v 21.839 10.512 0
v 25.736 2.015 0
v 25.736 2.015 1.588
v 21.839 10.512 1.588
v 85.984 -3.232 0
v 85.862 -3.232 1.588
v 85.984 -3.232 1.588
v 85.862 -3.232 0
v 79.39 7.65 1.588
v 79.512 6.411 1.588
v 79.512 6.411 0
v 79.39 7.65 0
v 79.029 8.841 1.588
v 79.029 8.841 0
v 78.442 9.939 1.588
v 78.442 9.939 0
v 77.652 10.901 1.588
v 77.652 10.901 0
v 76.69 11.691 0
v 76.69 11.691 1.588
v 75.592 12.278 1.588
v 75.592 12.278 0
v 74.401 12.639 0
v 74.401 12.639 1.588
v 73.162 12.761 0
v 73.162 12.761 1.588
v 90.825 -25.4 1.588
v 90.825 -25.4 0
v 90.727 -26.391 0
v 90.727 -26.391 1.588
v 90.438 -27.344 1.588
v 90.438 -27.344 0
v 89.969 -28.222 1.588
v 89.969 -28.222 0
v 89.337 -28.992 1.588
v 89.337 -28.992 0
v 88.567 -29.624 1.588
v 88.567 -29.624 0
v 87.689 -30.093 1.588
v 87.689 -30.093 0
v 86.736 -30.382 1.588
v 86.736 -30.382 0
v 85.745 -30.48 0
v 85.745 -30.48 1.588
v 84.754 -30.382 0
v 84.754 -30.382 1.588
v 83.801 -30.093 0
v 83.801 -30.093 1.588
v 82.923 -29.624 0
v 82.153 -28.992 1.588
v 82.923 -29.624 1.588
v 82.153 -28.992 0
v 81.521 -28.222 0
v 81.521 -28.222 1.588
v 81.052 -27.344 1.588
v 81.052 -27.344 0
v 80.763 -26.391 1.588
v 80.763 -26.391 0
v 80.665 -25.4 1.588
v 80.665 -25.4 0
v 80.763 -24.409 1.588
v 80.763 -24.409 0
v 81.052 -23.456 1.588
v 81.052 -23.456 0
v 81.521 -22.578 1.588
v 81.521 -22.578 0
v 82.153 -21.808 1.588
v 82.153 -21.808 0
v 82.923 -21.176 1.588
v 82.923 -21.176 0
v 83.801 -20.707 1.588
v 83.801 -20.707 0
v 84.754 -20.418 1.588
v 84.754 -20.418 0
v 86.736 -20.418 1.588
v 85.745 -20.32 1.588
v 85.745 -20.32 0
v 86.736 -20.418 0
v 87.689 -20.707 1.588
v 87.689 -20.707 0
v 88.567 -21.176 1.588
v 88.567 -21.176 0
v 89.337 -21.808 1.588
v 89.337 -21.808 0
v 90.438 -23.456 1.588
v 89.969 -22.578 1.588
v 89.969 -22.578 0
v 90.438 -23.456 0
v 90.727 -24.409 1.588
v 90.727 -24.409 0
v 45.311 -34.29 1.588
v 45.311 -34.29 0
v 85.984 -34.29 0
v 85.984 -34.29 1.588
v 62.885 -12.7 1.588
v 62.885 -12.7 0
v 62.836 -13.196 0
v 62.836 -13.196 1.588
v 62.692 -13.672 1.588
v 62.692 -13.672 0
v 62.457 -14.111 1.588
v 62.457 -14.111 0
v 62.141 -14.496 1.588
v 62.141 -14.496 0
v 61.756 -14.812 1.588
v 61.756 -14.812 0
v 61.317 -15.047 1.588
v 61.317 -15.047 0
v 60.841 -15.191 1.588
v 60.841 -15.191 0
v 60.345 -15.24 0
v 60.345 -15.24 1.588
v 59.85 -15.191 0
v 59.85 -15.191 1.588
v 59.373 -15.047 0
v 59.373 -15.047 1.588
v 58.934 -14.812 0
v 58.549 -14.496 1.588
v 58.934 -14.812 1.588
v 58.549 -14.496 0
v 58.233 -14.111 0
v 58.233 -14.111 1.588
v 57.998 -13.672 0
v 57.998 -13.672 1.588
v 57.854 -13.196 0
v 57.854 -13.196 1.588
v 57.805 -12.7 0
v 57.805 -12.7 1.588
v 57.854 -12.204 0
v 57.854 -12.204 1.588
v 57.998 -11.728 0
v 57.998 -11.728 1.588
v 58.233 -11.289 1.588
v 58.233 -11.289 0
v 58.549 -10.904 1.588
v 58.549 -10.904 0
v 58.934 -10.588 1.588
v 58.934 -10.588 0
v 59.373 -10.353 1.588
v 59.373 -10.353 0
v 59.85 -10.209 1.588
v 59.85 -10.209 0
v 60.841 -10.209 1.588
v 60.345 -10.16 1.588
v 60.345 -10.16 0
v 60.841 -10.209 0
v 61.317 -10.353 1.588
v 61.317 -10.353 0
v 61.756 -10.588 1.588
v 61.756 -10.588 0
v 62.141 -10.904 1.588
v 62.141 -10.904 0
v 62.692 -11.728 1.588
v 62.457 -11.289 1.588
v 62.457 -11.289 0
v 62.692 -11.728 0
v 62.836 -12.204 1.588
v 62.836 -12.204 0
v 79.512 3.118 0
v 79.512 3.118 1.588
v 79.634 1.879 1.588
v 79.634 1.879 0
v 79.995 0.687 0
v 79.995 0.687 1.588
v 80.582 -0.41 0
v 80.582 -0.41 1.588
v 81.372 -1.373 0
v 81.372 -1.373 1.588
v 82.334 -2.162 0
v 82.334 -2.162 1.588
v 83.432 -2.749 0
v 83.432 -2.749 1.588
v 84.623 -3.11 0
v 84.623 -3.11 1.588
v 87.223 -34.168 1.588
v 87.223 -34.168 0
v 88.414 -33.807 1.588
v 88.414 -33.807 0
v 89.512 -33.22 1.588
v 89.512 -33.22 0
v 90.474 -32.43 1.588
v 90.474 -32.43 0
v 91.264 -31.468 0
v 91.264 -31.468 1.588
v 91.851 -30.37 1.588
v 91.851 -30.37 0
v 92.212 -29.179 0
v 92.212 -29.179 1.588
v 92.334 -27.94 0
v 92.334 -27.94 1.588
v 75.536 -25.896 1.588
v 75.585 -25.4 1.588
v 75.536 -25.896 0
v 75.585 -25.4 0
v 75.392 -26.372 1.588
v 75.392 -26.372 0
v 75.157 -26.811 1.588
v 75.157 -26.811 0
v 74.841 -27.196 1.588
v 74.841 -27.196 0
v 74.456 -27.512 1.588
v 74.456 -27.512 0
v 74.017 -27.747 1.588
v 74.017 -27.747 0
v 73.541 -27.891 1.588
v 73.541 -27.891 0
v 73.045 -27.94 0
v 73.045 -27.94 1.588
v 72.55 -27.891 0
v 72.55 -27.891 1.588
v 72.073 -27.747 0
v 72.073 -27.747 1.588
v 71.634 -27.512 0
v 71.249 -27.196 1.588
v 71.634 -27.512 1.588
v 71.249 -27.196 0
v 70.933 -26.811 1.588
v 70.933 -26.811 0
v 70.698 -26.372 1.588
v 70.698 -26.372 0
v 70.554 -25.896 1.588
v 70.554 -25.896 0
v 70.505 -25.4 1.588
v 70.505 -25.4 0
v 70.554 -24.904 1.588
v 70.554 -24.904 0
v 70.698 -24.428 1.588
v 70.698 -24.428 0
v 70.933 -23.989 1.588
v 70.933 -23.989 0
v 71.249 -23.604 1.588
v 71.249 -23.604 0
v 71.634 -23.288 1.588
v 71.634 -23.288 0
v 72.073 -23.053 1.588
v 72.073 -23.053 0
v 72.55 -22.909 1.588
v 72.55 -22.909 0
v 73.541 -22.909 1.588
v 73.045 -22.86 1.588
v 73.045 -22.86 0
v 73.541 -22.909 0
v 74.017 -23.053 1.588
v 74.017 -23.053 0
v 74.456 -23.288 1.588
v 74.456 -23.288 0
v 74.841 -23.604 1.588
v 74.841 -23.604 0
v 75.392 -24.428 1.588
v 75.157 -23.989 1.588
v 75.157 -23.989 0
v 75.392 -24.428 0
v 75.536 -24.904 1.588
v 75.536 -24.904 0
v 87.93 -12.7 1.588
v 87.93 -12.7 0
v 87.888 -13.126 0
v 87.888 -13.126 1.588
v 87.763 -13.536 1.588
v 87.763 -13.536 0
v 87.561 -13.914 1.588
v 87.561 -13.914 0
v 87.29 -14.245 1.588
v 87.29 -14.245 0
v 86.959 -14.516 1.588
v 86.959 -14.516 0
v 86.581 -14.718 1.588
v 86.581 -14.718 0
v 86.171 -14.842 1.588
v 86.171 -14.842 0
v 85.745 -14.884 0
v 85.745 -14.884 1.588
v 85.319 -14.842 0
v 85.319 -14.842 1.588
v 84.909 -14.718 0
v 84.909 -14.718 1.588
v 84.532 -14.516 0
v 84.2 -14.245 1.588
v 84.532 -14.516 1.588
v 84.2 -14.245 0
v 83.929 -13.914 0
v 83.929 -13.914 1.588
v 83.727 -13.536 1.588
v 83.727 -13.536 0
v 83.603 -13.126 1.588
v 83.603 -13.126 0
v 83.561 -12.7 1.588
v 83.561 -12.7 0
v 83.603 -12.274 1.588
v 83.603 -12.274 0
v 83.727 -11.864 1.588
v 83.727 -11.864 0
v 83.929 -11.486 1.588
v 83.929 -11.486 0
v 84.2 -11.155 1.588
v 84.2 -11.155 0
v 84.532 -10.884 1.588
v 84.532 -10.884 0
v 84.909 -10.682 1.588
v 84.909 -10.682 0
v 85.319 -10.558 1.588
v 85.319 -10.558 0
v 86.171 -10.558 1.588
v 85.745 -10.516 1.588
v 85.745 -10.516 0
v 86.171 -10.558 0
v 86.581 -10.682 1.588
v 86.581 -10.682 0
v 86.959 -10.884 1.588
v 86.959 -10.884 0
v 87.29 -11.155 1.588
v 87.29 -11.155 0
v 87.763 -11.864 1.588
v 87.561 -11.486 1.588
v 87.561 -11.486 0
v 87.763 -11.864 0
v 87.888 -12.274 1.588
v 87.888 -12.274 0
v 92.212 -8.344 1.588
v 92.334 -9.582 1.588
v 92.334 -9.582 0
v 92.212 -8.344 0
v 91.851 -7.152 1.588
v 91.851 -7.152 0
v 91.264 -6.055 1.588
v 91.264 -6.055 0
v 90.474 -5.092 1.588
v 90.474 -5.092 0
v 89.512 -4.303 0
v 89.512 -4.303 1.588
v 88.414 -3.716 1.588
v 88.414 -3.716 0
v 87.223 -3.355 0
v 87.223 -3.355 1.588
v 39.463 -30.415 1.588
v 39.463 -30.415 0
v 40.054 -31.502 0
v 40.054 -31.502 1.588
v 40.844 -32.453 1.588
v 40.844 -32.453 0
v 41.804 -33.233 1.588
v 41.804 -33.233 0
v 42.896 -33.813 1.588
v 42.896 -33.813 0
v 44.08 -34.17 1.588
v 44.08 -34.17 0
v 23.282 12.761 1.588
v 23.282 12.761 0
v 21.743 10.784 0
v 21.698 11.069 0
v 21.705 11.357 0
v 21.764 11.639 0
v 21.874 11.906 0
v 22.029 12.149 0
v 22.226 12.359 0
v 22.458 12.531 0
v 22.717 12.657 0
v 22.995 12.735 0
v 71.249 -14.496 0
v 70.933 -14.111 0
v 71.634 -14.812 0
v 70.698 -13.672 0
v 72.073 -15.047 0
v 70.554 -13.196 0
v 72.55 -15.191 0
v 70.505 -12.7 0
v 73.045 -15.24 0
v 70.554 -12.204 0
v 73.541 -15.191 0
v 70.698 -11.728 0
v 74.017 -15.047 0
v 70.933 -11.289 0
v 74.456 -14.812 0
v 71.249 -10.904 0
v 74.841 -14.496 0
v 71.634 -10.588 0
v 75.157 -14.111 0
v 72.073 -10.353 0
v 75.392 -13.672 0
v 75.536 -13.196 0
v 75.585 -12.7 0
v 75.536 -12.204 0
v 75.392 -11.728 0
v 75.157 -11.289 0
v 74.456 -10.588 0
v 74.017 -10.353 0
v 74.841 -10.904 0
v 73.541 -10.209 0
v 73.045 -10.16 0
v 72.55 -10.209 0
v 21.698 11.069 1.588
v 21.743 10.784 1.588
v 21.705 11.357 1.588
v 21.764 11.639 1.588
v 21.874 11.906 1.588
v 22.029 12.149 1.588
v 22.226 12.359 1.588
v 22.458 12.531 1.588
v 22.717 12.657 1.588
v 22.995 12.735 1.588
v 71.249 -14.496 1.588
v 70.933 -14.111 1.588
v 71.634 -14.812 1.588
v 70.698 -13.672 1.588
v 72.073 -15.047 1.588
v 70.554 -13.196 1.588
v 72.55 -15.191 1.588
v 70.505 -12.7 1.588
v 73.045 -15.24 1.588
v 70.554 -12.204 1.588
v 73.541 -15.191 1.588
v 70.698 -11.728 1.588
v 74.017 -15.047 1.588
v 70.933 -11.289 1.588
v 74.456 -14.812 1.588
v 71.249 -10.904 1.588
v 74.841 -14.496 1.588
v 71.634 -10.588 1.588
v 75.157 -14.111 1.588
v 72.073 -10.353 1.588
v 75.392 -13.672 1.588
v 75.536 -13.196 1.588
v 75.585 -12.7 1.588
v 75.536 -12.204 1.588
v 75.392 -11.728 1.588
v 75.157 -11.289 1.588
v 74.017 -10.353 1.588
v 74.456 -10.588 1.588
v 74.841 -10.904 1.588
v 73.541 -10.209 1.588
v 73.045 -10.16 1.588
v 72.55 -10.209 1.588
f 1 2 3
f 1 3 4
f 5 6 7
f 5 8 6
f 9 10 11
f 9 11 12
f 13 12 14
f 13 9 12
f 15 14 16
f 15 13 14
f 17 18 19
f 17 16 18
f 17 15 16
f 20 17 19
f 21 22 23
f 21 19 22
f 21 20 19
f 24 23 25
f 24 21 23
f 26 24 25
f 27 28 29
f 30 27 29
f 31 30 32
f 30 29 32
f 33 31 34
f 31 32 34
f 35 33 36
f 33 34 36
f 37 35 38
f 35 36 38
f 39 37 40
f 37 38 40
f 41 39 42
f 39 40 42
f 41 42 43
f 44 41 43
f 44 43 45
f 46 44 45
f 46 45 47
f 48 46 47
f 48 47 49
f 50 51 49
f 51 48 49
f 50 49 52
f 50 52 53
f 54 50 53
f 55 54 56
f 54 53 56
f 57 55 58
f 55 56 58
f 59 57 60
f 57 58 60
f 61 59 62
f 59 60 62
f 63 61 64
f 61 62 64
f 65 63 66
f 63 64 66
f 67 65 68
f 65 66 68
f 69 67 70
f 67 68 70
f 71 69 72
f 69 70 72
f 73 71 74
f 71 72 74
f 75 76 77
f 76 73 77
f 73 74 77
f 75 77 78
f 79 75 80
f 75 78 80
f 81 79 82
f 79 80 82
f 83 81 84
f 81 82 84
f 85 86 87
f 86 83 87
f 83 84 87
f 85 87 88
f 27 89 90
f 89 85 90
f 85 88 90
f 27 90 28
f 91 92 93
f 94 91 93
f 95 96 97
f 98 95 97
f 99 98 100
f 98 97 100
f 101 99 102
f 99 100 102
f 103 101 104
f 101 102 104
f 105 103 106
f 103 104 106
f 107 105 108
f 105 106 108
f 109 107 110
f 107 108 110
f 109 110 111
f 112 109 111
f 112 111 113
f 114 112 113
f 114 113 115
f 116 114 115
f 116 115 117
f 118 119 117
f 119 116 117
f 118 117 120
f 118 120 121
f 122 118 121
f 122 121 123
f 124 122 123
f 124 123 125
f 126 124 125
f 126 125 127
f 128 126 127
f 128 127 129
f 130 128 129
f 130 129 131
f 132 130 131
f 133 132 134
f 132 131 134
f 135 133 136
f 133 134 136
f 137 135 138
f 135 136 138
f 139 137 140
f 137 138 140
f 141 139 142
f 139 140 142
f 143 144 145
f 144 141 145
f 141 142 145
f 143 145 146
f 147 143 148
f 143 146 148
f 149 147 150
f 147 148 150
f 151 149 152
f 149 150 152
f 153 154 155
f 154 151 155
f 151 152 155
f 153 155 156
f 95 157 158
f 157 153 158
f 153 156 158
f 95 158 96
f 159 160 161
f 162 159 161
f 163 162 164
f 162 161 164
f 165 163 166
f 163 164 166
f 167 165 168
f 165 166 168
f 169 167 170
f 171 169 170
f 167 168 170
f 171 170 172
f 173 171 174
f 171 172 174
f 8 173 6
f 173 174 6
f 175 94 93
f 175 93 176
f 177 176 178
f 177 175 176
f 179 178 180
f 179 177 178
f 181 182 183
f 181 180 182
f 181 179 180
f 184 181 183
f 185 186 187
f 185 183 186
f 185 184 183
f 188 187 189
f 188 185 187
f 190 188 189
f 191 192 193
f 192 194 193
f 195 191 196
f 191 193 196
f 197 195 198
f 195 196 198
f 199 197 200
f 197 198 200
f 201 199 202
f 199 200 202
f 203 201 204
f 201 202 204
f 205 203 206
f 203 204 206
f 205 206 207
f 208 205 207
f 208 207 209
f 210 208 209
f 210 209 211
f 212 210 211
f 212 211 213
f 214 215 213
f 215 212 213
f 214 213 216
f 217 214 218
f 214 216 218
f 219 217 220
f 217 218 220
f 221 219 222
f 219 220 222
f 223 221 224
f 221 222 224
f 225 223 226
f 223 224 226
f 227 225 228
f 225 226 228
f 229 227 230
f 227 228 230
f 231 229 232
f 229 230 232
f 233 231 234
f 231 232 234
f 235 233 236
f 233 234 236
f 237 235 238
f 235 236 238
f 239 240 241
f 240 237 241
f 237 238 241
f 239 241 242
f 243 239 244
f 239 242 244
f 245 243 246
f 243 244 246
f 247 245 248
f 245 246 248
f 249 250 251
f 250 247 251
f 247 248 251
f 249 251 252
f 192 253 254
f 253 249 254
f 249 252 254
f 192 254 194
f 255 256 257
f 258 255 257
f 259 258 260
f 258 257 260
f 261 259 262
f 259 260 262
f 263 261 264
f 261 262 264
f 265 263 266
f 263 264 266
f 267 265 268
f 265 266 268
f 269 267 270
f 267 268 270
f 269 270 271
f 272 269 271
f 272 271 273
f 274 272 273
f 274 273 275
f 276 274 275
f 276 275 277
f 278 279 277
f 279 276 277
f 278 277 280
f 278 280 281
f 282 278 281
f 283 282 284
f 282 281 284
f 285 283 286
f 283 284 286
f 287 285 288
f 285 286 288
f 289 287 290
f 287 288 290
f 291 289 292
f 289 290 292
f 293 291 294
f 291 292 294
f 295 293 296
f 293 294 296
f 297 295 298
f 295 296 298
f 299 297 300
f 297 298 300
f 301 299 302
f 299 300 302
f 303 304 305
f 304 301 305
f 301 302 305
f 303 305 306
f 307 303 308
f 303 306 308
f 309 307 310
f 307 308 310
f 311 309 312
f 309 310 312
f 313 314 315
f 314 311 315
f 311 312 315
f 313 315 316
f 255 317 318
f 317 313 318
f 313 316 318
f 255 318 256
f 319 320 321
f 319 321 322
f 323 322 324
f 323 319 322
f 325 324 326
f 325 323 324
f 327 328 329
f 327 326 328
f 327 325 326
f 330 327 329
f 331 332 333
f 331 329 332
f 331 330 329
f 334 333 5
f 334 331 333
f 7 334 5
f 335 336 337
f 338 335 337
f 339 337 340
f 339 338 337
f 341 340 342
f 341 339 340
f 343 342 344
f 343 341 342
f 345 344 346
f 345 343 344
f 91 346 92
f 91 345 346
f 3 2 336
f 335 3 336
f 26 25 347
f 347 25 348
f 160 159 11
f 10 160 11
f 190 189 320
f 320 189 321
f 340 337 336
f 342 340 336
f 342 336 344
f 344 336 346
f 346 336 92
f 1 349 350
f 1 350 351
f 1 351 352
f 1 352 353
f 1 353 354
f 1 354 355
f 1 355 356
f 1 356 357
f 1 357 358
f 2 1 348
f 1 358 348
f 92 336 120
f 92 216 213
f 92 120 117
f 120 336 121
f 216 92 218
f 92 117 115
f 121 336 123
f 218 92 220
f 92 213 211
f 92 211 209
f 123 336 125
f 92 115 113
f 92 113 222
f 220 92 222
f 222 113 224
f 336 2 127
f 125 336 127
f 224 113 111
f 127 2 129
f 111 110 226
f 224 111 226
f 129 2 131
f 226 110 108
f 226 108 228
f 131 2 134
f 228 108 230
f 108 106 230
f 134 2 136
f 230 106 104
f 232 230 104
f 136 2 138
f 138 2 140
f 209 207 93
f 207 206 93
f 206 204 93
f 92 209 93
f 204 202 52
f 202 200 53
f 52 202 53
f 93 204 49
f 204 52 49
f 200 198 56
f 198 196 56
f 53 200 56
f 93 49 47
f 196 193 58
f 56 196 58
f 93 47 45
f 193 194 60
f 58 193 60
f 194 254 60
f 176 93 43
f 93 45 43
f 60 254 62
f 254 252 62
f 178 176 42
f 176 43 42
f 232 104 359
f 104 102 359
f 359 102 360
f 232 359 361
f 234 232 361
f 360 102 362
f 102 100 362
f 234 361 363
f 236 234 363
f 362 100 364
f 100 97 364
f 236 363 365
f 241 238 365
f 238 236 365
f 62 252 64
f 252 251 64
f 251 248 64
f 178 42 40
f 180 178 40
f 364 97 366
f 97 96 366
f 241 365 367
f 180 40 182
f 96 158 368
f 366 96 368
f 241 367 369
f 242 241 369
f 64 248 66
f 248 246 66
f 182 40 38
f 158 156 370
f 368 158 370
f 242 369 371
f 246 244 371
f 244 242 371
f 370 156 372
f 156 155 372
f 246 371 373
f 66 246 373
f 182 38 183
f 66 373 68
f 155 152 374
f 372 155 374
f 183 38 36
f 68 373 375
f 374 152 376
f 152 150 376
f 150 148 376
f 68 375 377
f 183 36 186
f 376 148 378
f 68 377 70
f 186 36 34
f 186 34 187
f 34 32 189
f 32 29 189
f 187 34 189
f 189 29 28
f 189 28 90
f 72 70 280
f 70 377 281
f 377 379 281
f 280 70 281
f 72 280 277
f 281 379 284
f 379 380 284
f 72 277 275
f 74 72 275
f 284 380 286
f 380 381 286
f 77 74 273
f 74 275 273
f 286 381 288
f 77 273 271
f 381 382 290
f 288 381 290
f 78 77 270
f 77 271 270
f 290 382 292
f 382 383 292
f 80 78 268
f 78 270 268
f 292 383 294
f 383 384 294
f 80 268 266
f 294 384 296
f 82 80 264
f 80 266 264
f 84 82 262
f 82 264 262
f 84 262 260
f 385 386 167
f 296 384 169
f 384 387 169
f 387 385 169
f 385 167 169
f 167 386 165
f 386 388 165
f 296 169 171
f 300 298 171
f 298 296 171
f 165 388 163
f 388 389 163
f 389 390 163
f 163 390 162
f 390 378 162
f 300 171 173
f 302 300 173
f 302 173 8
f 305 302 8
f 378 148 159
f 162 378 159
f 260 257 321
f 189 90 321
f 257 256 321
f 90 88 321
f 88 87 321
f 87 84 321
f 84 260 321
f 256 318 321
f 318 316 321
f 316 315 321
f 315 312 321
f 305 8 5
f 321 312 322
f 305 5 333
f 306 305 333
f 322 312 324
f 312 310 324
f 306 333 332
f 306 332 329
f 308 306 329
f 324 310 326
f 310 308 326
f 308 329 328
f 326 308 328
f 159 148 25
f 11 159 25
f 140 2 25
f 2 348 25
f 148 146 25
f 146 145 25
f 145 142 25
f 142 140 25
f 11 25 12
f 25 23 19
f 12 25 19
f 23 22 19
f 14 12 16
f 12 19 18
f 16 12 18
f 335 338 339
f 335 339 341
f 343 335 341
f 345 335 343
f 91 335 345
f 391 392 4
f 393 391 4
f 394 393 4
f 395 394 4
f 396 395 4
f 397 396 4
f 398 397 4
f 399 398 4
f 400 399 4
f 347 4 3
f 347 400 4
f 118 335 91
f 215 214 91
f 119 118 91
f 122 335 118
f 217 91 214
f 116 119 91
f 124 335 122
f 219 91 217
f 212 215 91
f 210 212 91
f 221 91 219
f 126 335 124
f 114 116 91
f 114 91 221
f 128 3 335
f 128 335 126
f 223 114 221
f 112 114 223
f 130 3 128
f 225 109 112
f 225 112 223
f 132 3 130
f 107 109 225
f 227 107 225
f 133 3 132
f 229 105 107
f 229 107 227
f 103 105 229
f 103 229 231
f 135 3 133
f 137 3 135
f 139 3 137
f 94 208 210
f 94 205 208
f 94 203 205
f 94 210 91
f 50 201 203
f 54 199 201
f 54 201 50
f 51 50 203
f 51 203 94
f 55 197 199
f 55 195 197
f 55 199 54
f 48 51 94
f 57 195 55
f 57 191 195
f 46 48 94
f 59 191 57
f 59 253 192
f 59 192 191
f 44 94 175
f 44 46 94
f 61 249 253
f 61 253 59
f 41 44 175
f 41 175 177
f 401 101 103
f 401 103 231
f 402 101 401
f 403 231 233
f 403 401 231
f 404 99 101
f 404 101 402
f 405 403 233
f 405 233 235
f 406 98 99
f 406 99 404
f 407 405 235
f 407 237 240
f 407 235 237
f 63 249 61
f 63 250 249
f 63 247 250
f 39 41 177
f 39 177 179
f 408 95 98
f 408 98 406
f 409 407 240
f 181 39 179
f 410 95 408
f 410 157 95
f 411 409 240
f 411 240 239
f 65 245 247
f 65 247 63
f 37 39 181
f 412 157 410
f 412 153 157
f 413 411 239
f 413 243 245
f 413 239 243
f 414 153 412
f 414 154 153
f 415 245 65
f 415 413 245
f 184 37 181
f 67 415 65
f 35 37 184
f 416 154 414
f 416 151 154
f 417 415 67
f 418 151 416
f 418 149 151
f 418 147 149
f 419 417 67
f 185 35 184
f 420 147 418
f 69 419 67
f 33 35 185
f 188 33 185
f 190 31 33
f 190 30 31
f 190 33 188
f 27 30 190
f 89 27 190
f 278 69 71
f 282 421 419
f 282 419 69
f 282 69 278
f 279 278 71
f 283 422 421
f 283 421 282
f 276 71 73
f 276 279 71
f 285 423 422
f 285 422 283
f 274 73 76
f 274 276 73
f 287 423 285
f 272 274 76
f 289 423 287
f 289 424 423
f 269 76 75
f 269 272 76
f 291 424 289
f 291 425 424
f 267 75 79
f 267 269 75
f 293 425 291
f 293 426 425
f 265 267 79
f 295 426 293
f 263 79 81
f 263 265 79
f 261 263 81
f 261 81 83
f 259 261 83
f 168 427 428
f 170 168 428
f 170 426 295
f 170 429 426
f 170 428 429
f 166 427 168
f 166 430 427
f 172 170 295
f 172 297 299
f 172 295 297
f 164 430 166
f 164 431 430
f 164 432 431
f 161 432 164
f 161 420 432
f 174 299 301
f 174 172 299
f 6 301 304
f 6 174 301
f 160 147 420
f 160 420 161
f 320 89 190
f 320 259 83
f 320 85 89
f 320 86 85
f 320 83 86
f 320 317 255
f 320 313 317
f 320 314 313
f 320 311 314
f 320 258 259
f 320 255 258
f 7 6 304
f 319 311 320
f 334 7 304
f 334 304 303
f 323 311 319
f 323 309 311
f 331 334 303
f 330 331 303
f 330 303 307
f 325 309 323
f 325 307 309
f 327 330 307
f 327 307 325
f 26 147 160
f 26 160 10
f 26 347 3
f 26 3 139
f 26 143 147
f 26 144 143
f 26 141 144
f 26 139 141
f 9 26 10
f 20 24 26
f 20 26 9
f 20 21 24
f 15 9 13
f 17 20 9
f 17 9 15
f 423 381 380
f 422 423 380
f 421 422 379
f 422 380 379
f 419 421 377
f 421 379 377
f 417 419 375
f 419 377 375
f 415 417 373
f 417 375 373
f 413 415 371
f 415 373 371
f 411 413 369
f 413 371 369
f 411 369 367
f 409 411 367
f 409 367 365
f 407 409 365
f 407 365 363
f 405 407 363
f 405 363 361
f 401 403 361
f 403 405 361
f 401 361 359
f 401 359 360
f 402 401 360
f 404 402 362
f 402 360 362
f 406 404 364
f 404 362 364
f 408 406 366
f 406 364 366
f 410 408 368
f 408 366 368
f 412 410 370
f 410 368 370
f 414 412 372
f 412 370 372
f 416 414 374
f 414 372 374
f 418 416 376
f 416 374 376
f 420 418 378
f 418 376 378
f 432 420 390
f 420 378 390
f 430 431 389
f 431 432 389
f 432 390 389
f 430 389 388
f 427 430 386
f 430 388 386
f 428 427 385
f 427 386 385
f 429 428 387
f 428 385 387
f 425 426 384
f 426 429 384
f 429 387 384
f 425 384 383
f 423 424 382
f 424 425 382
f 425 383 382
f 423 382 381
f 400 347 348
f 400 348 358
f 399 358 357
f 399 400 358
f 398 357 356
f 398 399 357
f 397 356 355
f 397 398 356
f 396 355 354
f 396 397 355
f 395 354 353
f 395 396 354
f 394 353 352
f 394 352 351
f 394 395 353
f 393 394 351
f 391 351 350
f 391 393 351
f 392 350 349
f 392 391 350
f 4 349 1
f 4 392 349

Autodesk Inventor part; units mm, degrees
ref_plane "YZ Plane" through (0, 0, 0) normal (1, 0, 0) x (0, 1, 0)
ref_plane "XZ Plane" through (0, 0, 0) normal (0, 1, 0) x (-1, 0, 0)
ref_plane "XY Plane" through (0, 0, 0) normal (0, 0, 1) x (1, 0, 0)
sketch "Sketch2" plane through (0, 0, 0) normal (0, 0, 1) x (1, 0, 0)
  line L0 (39.8575, 12.7612) -> (31.599, 12.7612)
  line L1 (39.8575, 12.7612) -> (20.8075, 12.7612)
  line L2 (79.512, -31.9773) -> (79.512, 12.7612)
  line L3 (79.512, 12.7612) -> (37.4294, 12.7612)
  circle A0 centre (60.3451, -12.7) radius 2.54
  circle A1 centre (73.0451, -12.7) radius 2.54
  circle A2 centre (73.0451, -25.4) radius 2.54
  line L4 (92.334, -18.8499) -> (92.334, 1.5256)
  circle A3 centre (85.7451, -25.4) radius 3.9624
  circle A4 centre (85.7451, -12.7) radius 2.1844
  line L5 (25.7365, 2.0147) -> (43.2474, -39.355)
  line L6 (47.6451, -34.29) -> (41.1035, -34.29)
  line L7 (92.334, -18.8499) -> (92.334, -34.29)
  line L8 (47.6451, -34.29) -> (92.334, -34.29)
  line L9 (-341.1851, -3.2325) -> (91.1147, -3.2325)
  line L10 (25.7365, 2.0147) -> (20.8075, 12.7612)
  line L11 (91.1147, -3.2325) -> (92.334, -3.2325)
  circle A5 centre (85.7451, -25.4) radius 5.08
  point P0 (0, 0)
  point P1 (41.3274, -31.9773)
  point P2 (79.512, -18.8499)
  point P3 (79.512, -3.2325)
  dimension "d38" = 19.05
  dimension "d39" = 432.2999
  dimension "d40" = 10.16
extrude "Extrusion3" add sketch "Sketch2" along normal blind 1.5875 contours L3 L2 L9 L5 L10 L1 L0 | L9 L11 L4 L7 L8 L6 L5
fillet "Fillet9" radius 6.35 5 edges at (79.512, 12.7612, 0.7937) (79.512, -3.2325, 0.7937) (92.334, -3.2325, 0.7937) (92.334, -34.29, 0.7937) (41.1035, -34.29, 0.7937)
fillet "Fillet10" radius 1.5875 1 edges at (20.8075, 12.7612, 0.7937)
properties part number "Sleds poly V3"
